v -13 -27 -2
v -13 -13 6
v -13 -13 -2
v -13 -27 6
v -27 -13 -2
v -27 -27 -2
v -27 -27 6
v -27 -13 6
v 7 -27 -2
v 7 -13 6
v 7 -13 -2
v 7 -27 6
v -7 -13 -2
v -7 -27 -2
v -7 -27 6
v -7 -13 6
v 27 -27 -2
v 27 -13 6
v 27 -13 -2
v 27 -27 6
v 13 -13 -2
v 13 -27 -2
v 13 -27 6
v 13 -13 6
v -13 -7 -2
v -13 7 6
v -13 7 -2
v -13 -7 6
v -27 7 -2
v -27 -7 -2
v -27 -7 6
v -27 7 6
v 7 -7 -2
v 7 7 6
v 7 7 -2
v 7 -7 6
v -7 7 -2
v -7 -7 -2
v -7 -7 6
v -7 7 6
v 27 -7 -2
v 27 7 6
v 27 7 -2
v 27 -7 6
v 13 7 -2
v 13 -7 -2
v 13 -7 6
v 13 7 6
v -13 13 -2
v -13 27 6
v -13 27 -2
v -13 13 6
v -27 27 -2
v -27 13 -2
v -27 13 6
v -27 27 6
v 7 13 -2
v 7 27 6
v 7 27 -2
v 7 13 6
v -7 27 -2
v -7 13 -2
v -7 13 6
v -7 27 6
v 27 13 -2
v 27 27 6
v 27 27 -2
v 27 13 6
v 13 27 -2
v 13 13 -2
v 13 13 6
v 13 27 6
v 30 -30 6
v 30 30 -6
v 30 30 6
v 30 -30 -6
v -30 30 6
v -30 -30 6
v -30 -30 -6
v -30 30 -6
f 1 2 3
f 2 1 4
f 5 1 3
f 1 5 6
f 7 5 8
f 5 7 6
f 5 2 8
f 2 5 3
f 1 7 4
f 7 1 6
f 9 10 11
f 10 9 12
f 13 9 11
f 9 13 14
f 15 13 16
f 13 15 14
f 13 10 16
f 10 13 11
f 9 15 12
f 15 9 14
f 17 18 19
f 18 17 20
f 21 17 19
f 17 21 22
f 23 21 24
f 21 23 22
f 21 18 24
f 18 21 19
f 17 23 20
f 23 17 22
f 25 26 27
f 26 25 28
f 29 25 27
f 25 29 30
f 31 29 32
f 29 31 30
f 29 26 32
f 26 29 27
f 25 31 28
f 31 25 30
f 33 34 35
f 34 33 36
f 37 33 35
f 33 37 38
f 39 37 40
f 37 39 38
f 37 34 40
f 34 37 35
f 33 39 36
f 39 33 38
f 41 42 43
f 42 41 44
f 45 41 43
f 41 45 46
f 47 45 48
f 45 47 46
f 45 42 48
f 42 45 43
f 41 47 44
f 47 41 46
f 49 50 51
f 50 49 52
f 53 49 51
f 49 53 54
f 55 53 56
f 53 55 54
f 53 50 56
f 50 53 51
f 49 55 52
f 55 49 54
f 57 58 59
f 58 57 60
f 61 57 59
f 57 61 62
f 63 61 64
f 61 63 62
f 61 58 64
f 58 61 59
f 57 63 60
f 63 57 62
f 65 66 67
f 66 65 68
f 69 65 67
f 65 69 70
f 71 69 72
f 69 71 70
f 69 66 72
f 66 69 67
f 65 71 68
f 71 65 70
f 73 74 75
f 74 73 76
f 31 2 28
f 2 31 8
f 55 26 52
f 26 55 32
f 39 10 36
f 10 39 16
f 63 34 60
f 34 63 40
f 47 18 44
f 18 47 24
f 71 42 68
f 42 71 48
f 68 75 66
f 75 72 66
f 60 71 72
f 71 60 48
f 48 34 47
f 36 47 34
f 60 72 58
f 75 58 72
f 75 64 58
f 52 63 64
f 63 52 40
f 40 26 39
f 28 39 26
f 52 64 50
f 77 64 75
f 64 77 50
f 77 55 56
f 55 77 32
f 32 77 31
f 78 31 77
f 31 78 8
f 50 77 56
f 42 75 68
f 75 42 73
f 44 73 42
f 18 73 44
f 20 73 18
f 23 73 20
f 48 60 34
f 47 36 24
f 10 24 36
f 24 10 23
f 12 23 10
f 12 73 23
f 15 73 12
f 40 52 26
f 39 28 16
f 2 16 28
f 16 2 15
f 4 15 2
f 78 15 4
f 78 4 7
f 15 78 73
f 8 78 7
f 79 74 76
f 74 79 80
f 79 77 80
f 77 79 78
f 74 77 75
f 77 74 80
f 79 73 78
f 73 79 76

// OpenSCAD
$fn = 32;

// ----------------------------------------------------------------------
// Pocket plate 60 x 60 x 12
// 3 x 3 pockets 14 mm square, 8 mm deep
// ----------------------------------------------------------------------

// --- parameters (mm) ---
thickness = 12;   // plate thickness
seat_tol = 0.15;  // tolerance at the seating features
free_tol = 0.5;   // general tolerance on the free sizes
floor_t = 4;      // material left under each pocket
pocket = 14;      // pocket side length
pitch_x = 20;     // pocket pitch along X
pitch_y = 20;     // pocket pitch along Y
cols = 3;         // pockets per row
rows = 3;         // rows of pockets

// --- derived feature positions (mm) ---
depth = thickness - floor_t;        // = 8   pocket depth, down to the floor
span_x = (cols - 1) * pitch_x;      // = 40   distance between outer pockets
span_y = (rows - 1) * pitch_y;      // = 40   distance between outer pocket rows
origin_x = -span_x / 2;             // = -20   X of the first pocket
origin_y = -span_y / 2;             // = -20   Y of the first pocket
plate = [span_x + pocket + 6, span_y + pocket + 6, thickness];  // = [60, 60, 12]   overall size: pockets plus 3 mm of wall on each side
feature_centers = [
  [origin_x + 0 * pitch_x, origin_y + 0 * pitch_y],
  [origin_x + 1 * pitch_x, origin_y + 0 * pitch_y],
  [origin_x + 2 * pitch_x, origin_y + 0 * pitch_y],
  [origin_x + 0 * pitch_x, origin_y + 1 * pitch_y],
  [origin_x + 1 * pitch_x, origin_y + 1 * pitch_y],
  [origin_x + 2 * pitch_x, origin_y + 1 * pitch_y],
  [origin_x + 0 * pitch_x, origin_y + 2 * pitch_y],
  [origin_x + 1 * pitch_x, origin_y + 2 * pitch_y],
  [origin_x + 2 * pitch_x, origin_y + 2 * pitch_y]
];   // pocket centres, used verbatim by the cutter loop

// plate outline, then one pocket per centre in feature_centers
difference() {
  cube(plate, center = true);
  for (centre = feature_centers)
    translate([centre[0] - pocket / 2, centre[1] - pocket / 2, plate[2] / 2 - depth])
      cube([pocket, pocket, depth + 1]);  // centred on the declared pocket centre
}
